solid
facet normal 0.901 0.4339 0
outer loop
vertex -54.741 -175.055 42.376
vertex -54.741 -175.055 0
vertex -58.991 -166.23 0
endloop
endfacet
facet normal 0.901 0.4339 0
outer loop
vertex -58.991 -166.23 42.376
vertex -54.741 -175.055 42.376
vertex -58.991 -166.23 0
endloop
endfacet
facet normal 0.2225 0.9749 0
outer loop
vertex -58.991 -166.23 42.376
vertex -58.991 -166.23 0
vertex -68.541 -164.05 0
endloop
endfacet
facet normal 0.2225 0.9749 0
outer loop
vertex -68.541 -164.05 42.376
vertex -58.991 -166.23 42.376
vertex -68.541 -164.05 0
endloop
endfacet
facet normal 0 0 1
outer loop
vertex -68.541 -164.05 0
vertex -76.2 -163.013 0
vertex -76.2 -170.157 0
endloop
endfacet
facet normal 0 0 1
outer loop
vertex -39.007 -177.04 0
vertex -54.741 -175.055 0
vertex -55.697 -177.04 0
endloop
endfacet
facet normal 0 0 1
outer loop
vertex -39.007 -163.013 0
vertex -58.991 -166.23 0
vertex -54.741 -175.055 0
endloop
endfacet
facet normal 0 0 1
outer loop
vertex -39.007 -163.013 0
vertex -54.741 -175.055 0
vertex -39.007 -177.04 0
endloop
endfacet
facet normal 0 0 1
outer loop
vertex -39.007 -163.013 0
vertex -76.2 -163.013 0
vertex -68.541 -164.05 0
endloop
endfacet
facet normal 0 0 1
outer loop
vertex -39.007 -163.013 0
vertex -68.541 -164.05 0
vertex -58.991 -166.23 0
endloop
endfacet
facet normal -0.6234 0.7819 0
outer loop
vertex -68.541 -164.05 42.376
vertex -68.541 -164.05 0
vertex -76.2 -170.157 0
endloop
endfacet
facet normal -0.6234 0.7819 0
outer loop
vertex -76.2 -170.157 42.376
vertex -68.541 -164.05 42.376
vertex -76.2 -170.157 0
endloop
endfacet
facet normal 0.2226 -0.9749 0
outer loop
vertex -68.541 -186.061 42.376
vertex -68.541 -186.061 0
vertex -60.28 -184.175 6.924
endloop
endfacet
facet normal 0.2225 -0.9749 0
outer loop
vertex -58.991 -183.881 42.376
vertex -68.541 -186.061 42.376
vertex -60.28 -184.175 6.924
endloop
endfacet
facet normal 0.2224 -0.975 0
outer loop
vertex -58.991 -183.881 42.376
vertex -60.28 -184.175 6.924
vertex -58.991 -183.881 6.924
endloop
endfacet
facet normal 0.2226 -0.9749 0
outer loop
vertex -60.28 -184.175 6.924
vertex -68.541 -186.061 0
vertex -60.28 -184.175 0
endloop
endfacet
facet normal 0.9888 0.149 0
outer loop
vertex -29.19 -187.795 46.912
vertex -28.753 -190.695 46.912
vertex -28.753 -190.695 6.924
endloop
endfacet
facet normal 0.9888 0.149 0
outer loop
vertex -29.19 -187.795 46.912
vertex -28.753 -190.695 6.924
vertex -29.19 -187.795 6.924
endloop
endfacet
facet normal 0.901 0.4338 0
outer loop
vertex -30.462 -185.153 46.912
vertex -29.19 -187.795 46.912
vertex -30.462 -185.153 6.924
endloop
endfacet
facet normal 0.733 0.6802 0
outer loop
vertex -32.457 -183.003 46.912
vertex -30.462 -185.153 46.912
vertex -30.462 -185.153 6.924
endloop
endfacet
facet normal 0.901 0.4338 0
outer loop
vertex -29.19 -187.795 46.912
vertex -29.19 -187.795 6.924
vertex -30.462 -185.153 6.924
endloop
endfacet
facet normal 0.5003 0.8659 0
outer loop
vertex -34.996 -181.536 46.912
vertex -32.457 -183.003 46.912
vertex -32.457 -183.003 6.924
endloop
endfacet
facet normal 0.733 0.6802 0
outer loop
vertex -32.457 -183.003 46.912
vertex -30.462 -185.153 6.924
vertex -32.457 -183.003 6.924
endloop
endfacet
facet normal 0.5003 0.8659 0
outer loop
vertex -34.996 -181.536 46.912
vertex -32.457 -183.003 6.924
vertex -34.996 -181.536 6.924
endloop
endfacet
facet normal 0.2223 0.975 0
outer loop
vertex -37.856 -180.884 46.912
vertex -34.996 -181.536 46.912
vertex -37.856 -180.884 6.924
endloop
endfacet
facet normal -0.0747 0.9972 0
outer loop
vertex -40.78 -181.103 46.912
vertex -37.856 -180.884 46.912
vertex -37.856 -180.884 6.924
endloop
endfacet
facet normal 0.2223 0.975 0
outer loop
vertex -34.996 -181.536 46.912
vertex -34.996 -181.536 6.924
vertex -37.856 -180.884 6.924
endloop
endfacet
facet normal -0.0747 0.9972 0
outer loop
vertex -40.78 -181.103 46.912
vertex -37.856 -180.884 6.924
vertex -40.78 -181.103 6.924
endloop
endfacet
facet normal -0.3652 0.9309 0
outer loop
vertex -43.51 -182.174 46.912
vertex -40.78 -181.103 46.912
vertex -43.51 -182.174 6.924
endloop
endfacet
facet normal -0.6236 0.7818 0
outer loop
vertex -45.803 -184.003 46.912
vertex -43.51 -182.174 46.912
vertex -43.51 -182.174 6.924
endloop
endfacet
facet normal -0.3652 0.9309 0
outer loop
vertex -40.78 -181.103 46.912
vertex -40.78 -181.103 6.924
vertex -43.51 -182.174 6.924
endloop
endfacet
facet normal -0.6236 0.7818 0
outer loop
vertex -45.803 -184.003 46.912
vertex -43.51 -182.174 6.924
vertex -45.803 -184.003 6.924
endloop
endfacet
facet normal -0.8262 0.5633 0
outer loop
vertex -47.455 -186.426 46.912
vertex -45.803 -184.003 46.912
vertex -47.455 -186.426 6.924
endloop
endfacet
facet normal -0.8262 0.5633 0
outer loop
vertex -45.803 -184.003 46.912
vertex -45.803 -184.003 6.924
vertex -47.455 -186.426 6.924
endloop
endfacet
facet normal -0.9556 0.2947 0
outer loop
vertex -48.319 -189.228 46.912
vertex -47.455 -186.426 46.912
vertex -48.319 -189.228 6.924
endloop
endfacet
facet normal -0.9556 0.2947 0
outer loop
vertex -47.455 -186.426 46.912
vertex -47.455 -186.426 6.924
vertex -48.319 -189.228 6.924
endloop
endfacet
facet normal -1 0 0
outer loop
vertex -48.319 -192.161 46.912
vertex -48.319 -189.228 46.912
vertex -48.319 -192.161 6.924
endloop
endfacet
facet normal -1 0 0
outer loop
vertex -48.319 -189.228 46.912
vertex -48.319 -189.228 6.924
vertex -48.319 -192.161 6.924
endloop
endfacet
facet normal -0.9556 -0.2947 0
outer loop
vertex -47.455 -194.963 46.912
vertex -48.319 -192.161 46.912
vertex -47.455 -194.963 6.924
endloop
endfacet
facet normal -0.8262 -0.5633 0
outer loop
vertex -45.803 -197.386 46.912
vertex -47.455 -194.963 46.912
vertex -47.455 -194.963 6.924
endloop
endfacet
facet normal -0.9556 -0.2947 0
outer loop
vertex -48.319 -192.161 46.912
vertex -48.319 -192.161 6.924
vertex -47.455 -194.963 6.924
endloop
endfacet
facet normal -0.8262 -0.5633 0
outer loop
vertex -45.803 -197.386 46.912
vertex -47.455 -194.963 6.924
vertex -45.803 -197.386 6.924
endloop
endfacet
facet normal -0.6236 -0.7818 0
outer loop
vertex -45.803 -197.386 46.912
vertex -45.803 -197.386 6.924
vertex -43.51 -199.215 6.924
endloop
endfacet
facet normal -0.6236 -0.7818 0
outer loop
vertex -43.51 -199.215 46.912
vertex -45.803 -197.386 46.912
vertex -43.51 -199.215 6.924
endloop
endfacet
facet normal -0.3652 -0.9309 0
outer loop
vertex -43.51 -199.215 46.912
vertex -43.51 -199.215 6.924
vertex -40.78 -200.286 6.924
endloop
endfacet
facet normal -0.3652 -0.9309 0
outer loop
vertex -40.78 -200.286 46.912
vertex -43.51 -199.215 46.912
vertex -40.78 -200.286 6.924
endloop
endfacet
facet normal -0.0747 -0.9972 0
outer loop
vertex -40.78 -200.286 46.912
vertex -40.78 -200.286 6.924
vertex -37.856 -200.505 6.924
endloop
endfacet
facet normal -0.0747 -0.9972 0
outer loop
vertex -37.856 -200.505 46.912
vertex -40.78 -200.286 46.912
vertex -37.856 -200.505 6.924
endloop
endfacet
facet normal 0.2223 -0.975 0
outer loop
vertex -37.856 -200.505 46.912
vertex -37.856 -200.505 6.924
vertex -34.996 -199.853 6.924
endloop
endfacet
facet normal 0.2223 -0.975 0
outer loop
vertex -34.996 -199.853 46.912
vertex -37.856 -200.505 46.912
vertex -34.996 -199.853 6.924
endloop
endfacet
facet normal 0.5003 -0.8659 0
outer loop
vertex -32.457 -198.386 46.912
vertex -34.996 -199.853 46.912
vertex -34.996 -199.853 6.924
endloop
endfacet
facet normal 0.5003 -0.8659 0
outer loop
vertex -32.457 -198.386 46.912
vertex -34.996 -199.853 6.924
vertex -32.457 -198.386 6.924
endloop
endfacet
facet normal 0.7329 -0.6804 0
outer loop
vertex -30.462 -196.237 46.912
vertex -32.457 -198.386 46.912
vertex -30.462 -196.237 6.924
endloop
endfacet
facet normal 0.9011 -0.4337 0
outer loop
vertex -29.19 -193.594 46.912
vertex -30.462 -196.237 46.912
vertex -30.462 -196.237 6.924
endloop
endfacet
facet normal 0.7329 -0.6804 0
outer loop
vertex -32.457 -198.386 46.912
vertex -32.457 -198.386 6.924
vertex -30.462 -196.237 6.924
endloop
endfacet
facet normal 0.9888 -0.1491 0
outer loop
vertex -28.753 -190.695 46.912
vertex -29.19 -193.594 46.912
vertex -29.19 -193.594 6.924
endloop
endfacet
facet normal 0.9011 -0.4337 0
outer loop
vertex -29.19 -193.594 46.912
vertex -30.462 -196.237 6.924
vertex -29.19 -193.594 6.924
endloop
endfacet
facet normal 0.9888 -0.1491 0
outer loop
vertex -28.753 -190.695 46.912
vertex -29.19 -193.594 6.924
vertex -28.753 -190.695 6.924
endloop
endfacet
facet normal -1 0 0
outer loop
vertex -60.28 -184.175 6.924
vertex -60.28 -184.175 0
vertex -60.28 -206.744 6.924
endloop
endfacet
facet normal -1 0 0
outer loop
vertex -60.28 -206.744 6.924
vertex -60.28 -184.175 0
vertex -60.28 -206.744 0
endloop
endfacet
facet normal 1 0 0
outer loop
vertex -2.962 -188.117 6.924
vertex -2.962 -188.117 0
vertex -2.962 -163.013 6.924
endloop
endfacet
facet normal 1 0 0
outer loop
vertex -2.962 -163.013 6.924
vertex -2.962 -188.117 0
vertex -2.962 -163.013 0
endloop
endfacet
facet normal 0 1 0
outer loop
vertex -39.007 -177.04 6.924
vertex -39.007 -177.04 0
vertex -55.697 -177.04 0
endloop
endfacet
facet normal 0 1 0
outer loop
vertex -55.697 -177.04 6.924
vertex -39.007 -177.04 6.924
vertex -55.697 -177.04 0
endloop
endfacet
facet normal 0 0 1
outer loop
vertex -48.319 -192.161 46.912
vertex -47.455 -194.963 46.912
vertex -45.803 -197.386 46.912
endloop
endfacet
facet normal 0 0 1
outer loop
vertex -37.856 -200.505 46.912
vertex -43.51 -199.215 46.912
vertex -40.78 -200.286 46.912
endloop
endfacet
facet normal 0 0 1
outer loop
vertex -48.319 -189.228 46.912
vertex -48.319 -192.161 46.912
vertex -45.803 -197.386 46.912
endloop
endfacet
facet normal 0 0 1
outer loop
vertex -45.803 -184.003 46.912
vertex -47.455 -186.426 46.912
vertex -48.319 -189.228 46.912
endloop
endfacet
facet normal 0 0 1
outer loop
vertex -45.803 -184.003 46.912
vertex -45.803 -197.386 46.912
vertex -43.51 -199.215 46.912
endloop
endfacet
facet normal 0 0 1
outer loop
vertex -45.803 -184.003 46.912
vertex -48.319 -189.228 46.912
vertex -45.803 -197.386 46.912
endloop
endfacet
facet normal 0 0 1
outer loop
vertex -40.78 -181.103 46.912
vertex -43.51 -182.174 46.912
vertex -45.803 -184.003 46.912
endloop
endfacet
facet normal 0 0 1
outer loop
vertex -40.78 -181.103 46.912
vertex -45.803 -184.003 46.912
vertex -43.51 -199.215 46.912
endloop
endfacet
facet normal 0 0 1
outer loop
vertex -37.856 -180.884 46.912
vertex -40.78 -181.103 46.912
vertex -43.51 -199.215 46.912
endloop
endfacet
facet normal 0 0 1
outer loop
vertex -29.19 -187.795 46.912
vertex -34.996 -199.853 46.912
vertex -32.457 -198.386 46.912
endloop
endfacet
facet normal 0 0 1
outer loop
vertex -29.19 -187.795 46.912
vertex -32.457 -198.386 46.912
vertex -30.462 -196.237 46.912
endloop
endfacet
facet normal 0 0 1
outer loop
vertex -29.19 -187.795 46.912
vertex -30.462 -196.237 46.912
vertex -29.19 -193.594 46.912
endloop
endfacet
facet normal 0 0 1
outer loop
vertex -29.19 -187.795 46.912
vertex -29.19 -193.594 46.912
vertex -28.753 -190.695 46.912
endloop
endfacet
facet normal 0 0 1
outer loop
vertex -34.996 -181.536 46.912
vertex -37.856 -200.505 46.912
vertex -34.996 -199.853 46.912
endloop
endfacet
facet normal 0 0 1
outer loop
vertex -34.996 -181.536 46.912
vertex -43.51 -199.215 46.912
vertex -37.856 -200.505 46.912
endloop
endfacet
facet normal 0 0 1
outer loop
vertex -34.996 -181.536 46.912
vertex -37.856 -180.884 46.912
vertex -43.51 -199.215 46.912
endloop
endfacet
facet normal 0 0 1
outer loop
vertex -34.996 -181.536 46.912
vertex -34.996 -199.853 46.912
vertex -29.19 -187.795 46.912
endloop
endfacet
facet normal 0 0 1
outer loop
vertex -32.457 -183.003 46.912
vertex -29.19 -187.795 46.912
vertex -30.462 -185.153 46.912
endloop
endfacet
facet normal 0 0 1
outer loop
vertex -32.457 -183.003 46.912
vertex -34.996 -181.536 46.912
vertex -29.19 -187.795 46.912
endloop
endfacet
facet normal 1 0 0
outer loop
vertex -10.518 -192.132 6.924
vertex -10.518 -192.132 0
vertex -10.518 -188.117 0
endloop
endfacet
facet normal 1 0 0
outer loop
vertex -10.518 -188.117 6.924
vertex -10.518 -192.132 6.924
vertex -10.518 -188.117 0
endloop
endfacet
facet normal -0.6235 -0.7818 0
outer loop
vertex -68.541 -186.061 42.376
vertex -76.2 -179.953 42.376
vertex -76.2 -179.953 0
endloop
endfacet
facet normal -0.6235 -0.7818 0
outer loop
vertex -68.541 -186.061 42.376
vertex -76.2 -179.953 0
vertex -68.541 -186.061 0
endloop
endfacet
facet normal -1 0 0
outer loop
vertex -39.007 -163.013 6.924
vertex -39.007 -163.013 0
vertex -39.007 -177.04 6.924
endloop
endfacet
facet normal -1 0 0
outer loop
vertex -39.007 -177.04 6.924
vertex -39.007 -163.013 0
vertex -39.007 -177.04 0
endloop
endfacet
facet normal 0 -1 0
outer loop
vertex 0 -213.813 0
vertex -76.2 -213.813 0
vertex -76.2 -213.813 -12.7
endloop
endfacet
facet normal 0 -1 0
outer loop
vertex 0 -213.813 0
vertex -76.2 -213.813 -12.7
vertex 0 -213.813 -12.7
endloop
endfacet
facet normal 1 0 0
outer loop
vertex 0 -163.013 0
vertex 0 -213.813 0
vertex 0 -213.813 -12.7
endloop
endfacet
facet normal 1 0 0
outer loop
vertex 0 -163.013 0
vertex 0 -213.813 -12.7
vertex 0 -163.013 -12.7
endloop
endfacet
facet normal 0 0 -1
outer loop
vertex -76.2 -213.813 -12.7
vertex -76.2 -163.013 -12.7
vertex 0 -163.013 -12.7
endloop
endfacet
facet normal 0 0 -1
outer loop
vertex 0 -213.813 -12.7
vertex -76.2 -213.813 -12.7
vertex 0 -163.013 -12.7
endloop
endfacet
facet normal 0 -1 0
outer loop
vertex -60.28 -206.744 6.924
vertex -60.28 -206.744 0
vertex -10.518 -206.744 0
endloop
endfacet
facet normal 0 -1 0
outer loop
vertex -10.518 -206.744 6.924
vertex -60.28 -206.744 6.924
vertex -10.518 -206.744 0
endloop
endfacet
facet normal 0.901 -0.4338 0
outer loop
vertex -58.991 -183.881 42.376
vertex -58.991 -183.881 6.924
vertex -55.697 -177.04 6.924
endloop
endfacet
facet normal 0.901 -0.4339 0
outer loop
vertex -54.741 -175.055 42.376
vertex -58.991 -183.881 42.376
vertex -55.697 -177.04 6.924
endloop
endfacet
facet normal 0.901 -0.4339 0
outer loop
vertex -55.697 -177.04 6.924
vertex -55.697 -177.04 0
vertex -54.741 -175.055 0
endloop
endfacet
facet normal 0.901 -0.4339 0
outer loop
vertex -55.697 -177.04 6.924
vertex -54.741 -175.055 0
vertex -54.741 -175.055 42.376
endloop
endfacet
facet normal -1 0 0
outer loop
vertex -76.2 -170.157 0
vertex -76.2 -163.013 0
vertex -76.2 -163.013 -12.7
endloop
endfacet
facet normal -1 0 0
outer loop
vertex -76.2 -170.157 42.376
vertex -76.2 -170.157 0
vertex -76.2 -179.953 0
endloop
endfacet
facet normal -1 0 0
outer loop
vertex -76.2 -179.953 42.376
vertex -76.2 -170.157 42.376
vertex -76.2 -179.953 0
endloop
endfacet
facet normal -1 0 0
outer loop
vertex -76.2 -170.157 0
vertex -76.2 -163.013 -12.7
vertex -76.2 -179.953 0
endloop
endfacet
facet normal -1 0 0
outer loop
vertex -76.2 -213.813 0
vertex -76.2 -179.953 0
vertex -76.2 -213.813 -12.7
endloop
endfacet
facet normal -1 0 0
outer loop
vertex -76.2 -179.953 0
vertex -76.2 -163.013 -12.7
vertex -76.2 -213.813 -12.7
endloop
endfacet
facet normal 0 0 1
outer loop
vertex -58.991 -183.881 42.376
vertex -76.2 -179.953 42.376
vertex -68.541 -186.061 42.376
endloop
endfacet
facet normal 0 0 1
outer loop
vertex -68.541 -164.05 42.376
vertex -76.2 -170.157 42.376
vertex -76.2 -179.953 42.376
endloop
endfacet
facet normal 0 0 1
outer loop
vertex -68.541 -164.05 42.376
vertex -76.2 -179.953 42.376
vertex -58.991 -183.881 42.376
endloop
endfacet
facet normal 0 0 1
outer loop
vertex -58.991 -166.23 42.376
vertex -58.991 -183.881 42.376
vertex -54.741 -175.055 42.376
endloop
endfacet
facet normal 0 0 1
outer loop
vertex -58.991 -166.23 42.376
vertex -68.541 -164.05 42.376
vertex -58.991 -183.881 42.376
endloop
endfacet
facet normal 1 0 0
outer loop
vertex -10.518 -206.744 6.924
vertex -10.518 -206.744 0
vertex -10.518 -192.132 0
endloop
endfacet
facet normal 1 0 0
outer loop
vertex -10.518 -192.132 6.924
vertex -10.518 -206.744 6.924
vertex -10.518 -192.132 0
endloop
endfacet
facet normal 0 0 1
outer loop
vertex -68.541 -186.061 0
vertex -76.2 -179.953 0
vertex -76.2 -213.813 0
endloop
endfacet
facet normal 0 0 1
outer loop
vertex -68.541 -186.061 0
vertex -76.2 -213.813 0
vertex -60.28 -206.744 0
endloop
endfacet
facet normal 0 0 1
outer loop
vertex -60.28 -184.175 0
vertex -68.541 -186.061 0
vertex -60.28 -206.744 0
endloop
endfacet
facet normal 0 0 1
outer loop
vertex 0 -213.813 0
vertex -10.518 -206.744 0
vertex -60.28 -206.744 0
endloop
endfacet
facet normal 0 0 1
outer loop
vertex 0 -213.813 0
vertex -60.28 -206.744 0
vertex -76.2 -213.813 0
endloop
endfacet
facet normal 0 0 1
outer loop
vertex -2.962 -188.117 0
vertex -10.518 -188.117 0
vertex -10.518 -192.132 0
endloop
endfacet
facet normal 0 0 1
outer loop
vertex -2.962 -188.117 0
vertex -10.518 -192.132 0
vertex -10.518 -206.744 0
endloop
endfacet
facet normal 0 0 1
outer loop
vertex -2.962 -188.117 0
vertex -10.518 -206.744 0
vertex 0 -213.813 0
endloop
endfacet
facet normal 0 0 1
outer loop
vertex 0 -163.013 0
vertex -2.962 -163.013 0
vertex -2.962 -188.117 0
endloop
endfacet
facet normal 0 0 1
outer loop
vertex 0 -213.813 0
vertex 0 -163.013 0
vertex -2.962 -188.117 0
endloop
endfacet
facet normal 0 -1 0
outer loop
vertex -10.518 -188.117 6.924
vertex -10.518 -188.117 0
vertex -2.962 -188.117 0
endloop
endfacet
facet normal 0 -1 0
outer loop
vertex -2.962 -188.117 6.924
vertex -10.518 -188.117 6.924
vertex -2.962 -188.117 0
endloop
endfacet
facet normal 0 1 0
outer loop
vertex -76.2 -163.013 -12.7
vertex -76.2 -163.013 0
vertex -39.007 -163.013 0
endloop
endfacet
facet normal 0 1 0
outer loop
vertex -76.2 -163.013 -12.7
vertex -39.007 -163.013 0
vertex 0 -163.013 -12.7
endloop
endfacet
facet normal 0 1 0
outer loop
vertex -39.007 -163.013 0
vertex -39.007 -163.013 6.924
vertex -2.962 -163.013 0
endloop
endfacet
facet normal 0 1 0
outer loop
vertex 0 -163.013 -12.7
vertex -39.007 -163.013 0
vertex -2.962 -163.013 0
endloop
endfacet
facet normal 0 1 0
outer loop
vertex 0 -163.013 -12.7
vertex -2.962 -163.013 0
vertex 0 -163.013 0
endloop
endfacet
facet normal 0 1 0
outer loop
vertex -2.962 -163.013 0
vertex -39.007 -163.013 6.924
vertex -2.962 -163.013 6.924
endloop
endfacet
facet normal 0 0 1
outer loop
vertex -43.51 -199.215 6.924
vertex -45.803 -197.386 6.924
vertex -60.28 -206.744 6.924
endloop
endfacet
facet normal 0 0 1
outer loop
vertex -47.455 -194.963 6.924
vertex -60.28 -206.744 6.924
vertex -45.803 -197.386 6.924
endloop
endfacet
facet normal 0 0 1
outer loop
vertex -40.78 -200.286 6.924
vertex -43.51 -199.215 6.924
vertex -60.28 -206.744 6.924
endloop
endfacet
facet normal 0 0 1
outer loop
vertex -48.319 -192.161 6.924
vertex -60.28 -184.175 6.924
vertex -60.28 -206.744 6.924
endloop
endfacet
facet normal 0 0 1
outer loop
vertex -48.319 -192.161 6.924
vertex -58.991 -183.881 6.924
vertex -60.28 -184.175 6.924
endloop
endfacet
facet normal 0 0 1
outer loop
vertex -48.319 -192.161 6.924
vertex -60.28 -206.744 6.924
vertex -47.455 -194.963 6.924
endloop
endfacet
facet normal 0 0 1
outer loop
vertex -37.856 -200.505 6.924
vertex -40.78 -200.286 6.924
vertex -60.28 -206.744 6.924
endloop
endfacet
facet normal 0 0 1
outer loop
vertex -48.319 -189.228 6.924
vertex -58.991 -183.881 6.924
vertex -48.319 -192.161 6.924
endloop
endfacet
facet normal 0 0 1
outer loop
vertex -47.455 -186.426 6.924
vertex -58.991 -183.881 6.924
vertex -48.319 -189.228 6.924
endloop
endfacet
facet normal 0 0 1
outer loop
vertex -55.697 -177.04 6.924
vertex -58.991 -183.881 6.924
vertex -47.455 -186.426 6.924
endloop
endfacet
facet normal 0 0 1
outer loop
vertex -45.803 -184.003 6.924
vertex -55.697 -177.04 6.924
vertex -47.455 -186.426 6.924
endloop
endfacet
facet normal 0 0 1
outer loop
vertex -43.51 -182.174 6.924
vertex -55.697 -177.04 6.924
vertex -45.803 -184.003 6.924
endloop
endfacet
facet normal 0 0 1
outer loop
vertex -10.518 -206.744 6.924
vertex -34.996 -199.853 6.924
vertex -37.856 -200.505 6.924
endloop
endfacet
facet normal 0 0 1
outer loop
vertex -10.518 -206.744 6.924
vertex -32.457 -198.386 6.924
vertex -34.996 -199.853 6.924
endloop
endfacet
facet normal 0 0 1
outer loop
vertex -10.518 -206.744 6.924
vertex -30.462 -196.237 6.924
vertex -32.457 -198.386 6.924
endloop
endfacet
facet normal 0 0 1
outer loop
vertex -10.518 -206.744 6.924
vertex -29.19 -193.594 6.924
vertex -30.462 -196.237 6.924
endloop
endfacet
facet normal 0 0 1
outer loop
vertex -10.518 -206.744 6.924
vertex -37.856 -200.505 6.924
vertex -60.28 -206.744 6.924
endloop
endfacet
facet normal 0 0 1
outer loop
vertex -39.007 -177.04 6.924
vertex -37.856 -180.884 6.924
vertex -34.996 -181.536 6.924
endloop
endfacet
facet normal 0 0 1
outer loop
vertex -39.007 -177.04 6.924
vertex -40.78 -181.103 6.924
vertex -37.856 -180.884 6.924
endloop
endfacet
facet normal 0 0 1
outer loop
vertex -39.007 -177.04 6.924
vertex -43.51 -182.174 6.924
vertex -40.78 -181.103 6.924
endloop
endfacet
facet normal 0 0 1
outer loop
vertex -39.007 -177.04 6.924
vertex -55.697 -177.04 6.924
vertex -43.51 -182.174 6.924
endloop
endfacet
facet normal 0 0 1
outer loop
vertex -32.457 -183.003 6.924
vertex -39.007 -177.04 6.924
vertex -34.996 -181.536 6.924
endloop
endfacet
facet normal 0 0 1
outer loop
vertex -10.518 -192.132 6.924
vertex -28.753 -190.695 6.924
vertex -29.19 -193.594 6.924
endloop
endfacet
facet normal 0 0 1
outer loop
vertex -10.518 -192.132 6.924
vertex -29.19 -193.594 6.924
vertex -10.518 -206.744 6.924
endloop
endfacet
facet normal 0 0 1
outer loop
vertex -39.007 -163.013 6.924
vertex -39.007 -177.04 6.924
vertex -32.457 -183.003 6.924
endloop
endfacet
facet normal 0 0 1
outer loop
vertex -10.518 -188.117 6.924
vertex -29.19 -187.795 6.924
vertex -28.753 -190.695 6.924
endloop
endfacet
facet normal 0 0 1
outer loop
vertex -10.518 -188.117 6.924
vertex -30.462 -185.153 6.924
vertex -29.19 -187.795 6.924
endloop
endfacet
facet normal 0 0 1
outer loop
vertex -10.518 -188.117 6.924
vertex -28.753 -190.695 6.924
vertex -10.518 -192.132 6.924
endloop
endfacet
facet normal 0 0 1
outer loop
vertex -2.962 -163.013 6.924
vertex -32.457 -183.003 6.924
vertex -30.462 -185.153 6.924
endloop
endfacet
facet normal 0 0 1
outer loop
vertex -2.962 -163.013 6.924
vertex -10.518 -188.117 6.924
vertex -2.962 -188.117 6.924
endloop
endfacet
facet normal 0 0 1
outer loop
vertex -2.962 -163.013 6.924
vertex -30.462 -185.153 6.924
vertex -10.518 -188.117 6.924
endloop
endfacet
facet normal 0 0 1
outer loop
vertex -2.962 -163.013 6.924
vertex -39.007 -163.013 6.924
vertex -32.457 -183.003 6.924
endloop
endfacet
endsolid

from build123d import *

# Parameters (mm, degrees)
F0_W     = 76.2
F0_H     = 50.8
F1_DEPTH = 12.7
F2_W     = 49.7612692416
F2_H     = 14.612480998
F2_W_2   = 28.4890644252
F2_H_2   = 11.0769122839
F3_DEPTH = 6.9243321195
F4_R     = 9.8381563478
F5_DEPTH = 39.9880222976
F7_DEPTH = 42.3764139414


with BuildPart() as f1:
    # F0 (on Top) → F1 (new body)
    with BuildSketch(Plane.XY):
        with Locations((-38.1, -188.4133778646)):
            Rectangle(F0_W, F0_H)
    extrude(amount=-F1_DEPTH)

    # F2 (on face) → F3 (join)
    with BuildSketch(Plane.XY):
        with Locations((-35.398973152, -199.4379386306)):
            Rectangle(F2_W, F2_H)
        Polygon((-60.2796077728, -177.0403236151), (-60.2796077728, -192.1316981316), (-10.5183385313, -192.1316981316), (-10.5183385313, -188.117235899), (-39.0074029565, -188.117235899), (-39.0074029565, -177.0403236151), align=None)
        with Locations((-24.7628707439, -182.578779757)):
            Rectangle(F2_W_2, F2_H_2)
        Polygon((-10.5183385313, -177.0403236151), (-10.5183385313, -188.117235899), (-2.9622917064, -188.117235899), (-2.9622917064, -163.0133778646), (-39.0074029565, -163.0133778646), (-39.0074029565, -177.0403236151), align=None)
    extrude(amount=F3_DEPTH)

    # F4 (on face) → F5 (join)
    with BuildSketch(Plane.XY.offset(6.9243321195)):
        with Locations((-38.5907627642, -190.6945705414)):
            Circle(F4_R)
    extrude(amount=F5_DEPTH)

    # F6 (on face) → F7 (join)
    with BuildSketch(Plane.XY):
        Polygon((-76.2, -170.1574557203), (-76.2, -179.9530751329), (-68.5414763529, -186.0605439396), (-58.9914535705, -183.8808135592), (-54.7412935927, -175.0552654266), (-58.9914535705, -166.229717294), (-68.5414763529, -164.0499869137), align=None)
    extrude(amount=F7_DEPTH)


solid = f1.part
